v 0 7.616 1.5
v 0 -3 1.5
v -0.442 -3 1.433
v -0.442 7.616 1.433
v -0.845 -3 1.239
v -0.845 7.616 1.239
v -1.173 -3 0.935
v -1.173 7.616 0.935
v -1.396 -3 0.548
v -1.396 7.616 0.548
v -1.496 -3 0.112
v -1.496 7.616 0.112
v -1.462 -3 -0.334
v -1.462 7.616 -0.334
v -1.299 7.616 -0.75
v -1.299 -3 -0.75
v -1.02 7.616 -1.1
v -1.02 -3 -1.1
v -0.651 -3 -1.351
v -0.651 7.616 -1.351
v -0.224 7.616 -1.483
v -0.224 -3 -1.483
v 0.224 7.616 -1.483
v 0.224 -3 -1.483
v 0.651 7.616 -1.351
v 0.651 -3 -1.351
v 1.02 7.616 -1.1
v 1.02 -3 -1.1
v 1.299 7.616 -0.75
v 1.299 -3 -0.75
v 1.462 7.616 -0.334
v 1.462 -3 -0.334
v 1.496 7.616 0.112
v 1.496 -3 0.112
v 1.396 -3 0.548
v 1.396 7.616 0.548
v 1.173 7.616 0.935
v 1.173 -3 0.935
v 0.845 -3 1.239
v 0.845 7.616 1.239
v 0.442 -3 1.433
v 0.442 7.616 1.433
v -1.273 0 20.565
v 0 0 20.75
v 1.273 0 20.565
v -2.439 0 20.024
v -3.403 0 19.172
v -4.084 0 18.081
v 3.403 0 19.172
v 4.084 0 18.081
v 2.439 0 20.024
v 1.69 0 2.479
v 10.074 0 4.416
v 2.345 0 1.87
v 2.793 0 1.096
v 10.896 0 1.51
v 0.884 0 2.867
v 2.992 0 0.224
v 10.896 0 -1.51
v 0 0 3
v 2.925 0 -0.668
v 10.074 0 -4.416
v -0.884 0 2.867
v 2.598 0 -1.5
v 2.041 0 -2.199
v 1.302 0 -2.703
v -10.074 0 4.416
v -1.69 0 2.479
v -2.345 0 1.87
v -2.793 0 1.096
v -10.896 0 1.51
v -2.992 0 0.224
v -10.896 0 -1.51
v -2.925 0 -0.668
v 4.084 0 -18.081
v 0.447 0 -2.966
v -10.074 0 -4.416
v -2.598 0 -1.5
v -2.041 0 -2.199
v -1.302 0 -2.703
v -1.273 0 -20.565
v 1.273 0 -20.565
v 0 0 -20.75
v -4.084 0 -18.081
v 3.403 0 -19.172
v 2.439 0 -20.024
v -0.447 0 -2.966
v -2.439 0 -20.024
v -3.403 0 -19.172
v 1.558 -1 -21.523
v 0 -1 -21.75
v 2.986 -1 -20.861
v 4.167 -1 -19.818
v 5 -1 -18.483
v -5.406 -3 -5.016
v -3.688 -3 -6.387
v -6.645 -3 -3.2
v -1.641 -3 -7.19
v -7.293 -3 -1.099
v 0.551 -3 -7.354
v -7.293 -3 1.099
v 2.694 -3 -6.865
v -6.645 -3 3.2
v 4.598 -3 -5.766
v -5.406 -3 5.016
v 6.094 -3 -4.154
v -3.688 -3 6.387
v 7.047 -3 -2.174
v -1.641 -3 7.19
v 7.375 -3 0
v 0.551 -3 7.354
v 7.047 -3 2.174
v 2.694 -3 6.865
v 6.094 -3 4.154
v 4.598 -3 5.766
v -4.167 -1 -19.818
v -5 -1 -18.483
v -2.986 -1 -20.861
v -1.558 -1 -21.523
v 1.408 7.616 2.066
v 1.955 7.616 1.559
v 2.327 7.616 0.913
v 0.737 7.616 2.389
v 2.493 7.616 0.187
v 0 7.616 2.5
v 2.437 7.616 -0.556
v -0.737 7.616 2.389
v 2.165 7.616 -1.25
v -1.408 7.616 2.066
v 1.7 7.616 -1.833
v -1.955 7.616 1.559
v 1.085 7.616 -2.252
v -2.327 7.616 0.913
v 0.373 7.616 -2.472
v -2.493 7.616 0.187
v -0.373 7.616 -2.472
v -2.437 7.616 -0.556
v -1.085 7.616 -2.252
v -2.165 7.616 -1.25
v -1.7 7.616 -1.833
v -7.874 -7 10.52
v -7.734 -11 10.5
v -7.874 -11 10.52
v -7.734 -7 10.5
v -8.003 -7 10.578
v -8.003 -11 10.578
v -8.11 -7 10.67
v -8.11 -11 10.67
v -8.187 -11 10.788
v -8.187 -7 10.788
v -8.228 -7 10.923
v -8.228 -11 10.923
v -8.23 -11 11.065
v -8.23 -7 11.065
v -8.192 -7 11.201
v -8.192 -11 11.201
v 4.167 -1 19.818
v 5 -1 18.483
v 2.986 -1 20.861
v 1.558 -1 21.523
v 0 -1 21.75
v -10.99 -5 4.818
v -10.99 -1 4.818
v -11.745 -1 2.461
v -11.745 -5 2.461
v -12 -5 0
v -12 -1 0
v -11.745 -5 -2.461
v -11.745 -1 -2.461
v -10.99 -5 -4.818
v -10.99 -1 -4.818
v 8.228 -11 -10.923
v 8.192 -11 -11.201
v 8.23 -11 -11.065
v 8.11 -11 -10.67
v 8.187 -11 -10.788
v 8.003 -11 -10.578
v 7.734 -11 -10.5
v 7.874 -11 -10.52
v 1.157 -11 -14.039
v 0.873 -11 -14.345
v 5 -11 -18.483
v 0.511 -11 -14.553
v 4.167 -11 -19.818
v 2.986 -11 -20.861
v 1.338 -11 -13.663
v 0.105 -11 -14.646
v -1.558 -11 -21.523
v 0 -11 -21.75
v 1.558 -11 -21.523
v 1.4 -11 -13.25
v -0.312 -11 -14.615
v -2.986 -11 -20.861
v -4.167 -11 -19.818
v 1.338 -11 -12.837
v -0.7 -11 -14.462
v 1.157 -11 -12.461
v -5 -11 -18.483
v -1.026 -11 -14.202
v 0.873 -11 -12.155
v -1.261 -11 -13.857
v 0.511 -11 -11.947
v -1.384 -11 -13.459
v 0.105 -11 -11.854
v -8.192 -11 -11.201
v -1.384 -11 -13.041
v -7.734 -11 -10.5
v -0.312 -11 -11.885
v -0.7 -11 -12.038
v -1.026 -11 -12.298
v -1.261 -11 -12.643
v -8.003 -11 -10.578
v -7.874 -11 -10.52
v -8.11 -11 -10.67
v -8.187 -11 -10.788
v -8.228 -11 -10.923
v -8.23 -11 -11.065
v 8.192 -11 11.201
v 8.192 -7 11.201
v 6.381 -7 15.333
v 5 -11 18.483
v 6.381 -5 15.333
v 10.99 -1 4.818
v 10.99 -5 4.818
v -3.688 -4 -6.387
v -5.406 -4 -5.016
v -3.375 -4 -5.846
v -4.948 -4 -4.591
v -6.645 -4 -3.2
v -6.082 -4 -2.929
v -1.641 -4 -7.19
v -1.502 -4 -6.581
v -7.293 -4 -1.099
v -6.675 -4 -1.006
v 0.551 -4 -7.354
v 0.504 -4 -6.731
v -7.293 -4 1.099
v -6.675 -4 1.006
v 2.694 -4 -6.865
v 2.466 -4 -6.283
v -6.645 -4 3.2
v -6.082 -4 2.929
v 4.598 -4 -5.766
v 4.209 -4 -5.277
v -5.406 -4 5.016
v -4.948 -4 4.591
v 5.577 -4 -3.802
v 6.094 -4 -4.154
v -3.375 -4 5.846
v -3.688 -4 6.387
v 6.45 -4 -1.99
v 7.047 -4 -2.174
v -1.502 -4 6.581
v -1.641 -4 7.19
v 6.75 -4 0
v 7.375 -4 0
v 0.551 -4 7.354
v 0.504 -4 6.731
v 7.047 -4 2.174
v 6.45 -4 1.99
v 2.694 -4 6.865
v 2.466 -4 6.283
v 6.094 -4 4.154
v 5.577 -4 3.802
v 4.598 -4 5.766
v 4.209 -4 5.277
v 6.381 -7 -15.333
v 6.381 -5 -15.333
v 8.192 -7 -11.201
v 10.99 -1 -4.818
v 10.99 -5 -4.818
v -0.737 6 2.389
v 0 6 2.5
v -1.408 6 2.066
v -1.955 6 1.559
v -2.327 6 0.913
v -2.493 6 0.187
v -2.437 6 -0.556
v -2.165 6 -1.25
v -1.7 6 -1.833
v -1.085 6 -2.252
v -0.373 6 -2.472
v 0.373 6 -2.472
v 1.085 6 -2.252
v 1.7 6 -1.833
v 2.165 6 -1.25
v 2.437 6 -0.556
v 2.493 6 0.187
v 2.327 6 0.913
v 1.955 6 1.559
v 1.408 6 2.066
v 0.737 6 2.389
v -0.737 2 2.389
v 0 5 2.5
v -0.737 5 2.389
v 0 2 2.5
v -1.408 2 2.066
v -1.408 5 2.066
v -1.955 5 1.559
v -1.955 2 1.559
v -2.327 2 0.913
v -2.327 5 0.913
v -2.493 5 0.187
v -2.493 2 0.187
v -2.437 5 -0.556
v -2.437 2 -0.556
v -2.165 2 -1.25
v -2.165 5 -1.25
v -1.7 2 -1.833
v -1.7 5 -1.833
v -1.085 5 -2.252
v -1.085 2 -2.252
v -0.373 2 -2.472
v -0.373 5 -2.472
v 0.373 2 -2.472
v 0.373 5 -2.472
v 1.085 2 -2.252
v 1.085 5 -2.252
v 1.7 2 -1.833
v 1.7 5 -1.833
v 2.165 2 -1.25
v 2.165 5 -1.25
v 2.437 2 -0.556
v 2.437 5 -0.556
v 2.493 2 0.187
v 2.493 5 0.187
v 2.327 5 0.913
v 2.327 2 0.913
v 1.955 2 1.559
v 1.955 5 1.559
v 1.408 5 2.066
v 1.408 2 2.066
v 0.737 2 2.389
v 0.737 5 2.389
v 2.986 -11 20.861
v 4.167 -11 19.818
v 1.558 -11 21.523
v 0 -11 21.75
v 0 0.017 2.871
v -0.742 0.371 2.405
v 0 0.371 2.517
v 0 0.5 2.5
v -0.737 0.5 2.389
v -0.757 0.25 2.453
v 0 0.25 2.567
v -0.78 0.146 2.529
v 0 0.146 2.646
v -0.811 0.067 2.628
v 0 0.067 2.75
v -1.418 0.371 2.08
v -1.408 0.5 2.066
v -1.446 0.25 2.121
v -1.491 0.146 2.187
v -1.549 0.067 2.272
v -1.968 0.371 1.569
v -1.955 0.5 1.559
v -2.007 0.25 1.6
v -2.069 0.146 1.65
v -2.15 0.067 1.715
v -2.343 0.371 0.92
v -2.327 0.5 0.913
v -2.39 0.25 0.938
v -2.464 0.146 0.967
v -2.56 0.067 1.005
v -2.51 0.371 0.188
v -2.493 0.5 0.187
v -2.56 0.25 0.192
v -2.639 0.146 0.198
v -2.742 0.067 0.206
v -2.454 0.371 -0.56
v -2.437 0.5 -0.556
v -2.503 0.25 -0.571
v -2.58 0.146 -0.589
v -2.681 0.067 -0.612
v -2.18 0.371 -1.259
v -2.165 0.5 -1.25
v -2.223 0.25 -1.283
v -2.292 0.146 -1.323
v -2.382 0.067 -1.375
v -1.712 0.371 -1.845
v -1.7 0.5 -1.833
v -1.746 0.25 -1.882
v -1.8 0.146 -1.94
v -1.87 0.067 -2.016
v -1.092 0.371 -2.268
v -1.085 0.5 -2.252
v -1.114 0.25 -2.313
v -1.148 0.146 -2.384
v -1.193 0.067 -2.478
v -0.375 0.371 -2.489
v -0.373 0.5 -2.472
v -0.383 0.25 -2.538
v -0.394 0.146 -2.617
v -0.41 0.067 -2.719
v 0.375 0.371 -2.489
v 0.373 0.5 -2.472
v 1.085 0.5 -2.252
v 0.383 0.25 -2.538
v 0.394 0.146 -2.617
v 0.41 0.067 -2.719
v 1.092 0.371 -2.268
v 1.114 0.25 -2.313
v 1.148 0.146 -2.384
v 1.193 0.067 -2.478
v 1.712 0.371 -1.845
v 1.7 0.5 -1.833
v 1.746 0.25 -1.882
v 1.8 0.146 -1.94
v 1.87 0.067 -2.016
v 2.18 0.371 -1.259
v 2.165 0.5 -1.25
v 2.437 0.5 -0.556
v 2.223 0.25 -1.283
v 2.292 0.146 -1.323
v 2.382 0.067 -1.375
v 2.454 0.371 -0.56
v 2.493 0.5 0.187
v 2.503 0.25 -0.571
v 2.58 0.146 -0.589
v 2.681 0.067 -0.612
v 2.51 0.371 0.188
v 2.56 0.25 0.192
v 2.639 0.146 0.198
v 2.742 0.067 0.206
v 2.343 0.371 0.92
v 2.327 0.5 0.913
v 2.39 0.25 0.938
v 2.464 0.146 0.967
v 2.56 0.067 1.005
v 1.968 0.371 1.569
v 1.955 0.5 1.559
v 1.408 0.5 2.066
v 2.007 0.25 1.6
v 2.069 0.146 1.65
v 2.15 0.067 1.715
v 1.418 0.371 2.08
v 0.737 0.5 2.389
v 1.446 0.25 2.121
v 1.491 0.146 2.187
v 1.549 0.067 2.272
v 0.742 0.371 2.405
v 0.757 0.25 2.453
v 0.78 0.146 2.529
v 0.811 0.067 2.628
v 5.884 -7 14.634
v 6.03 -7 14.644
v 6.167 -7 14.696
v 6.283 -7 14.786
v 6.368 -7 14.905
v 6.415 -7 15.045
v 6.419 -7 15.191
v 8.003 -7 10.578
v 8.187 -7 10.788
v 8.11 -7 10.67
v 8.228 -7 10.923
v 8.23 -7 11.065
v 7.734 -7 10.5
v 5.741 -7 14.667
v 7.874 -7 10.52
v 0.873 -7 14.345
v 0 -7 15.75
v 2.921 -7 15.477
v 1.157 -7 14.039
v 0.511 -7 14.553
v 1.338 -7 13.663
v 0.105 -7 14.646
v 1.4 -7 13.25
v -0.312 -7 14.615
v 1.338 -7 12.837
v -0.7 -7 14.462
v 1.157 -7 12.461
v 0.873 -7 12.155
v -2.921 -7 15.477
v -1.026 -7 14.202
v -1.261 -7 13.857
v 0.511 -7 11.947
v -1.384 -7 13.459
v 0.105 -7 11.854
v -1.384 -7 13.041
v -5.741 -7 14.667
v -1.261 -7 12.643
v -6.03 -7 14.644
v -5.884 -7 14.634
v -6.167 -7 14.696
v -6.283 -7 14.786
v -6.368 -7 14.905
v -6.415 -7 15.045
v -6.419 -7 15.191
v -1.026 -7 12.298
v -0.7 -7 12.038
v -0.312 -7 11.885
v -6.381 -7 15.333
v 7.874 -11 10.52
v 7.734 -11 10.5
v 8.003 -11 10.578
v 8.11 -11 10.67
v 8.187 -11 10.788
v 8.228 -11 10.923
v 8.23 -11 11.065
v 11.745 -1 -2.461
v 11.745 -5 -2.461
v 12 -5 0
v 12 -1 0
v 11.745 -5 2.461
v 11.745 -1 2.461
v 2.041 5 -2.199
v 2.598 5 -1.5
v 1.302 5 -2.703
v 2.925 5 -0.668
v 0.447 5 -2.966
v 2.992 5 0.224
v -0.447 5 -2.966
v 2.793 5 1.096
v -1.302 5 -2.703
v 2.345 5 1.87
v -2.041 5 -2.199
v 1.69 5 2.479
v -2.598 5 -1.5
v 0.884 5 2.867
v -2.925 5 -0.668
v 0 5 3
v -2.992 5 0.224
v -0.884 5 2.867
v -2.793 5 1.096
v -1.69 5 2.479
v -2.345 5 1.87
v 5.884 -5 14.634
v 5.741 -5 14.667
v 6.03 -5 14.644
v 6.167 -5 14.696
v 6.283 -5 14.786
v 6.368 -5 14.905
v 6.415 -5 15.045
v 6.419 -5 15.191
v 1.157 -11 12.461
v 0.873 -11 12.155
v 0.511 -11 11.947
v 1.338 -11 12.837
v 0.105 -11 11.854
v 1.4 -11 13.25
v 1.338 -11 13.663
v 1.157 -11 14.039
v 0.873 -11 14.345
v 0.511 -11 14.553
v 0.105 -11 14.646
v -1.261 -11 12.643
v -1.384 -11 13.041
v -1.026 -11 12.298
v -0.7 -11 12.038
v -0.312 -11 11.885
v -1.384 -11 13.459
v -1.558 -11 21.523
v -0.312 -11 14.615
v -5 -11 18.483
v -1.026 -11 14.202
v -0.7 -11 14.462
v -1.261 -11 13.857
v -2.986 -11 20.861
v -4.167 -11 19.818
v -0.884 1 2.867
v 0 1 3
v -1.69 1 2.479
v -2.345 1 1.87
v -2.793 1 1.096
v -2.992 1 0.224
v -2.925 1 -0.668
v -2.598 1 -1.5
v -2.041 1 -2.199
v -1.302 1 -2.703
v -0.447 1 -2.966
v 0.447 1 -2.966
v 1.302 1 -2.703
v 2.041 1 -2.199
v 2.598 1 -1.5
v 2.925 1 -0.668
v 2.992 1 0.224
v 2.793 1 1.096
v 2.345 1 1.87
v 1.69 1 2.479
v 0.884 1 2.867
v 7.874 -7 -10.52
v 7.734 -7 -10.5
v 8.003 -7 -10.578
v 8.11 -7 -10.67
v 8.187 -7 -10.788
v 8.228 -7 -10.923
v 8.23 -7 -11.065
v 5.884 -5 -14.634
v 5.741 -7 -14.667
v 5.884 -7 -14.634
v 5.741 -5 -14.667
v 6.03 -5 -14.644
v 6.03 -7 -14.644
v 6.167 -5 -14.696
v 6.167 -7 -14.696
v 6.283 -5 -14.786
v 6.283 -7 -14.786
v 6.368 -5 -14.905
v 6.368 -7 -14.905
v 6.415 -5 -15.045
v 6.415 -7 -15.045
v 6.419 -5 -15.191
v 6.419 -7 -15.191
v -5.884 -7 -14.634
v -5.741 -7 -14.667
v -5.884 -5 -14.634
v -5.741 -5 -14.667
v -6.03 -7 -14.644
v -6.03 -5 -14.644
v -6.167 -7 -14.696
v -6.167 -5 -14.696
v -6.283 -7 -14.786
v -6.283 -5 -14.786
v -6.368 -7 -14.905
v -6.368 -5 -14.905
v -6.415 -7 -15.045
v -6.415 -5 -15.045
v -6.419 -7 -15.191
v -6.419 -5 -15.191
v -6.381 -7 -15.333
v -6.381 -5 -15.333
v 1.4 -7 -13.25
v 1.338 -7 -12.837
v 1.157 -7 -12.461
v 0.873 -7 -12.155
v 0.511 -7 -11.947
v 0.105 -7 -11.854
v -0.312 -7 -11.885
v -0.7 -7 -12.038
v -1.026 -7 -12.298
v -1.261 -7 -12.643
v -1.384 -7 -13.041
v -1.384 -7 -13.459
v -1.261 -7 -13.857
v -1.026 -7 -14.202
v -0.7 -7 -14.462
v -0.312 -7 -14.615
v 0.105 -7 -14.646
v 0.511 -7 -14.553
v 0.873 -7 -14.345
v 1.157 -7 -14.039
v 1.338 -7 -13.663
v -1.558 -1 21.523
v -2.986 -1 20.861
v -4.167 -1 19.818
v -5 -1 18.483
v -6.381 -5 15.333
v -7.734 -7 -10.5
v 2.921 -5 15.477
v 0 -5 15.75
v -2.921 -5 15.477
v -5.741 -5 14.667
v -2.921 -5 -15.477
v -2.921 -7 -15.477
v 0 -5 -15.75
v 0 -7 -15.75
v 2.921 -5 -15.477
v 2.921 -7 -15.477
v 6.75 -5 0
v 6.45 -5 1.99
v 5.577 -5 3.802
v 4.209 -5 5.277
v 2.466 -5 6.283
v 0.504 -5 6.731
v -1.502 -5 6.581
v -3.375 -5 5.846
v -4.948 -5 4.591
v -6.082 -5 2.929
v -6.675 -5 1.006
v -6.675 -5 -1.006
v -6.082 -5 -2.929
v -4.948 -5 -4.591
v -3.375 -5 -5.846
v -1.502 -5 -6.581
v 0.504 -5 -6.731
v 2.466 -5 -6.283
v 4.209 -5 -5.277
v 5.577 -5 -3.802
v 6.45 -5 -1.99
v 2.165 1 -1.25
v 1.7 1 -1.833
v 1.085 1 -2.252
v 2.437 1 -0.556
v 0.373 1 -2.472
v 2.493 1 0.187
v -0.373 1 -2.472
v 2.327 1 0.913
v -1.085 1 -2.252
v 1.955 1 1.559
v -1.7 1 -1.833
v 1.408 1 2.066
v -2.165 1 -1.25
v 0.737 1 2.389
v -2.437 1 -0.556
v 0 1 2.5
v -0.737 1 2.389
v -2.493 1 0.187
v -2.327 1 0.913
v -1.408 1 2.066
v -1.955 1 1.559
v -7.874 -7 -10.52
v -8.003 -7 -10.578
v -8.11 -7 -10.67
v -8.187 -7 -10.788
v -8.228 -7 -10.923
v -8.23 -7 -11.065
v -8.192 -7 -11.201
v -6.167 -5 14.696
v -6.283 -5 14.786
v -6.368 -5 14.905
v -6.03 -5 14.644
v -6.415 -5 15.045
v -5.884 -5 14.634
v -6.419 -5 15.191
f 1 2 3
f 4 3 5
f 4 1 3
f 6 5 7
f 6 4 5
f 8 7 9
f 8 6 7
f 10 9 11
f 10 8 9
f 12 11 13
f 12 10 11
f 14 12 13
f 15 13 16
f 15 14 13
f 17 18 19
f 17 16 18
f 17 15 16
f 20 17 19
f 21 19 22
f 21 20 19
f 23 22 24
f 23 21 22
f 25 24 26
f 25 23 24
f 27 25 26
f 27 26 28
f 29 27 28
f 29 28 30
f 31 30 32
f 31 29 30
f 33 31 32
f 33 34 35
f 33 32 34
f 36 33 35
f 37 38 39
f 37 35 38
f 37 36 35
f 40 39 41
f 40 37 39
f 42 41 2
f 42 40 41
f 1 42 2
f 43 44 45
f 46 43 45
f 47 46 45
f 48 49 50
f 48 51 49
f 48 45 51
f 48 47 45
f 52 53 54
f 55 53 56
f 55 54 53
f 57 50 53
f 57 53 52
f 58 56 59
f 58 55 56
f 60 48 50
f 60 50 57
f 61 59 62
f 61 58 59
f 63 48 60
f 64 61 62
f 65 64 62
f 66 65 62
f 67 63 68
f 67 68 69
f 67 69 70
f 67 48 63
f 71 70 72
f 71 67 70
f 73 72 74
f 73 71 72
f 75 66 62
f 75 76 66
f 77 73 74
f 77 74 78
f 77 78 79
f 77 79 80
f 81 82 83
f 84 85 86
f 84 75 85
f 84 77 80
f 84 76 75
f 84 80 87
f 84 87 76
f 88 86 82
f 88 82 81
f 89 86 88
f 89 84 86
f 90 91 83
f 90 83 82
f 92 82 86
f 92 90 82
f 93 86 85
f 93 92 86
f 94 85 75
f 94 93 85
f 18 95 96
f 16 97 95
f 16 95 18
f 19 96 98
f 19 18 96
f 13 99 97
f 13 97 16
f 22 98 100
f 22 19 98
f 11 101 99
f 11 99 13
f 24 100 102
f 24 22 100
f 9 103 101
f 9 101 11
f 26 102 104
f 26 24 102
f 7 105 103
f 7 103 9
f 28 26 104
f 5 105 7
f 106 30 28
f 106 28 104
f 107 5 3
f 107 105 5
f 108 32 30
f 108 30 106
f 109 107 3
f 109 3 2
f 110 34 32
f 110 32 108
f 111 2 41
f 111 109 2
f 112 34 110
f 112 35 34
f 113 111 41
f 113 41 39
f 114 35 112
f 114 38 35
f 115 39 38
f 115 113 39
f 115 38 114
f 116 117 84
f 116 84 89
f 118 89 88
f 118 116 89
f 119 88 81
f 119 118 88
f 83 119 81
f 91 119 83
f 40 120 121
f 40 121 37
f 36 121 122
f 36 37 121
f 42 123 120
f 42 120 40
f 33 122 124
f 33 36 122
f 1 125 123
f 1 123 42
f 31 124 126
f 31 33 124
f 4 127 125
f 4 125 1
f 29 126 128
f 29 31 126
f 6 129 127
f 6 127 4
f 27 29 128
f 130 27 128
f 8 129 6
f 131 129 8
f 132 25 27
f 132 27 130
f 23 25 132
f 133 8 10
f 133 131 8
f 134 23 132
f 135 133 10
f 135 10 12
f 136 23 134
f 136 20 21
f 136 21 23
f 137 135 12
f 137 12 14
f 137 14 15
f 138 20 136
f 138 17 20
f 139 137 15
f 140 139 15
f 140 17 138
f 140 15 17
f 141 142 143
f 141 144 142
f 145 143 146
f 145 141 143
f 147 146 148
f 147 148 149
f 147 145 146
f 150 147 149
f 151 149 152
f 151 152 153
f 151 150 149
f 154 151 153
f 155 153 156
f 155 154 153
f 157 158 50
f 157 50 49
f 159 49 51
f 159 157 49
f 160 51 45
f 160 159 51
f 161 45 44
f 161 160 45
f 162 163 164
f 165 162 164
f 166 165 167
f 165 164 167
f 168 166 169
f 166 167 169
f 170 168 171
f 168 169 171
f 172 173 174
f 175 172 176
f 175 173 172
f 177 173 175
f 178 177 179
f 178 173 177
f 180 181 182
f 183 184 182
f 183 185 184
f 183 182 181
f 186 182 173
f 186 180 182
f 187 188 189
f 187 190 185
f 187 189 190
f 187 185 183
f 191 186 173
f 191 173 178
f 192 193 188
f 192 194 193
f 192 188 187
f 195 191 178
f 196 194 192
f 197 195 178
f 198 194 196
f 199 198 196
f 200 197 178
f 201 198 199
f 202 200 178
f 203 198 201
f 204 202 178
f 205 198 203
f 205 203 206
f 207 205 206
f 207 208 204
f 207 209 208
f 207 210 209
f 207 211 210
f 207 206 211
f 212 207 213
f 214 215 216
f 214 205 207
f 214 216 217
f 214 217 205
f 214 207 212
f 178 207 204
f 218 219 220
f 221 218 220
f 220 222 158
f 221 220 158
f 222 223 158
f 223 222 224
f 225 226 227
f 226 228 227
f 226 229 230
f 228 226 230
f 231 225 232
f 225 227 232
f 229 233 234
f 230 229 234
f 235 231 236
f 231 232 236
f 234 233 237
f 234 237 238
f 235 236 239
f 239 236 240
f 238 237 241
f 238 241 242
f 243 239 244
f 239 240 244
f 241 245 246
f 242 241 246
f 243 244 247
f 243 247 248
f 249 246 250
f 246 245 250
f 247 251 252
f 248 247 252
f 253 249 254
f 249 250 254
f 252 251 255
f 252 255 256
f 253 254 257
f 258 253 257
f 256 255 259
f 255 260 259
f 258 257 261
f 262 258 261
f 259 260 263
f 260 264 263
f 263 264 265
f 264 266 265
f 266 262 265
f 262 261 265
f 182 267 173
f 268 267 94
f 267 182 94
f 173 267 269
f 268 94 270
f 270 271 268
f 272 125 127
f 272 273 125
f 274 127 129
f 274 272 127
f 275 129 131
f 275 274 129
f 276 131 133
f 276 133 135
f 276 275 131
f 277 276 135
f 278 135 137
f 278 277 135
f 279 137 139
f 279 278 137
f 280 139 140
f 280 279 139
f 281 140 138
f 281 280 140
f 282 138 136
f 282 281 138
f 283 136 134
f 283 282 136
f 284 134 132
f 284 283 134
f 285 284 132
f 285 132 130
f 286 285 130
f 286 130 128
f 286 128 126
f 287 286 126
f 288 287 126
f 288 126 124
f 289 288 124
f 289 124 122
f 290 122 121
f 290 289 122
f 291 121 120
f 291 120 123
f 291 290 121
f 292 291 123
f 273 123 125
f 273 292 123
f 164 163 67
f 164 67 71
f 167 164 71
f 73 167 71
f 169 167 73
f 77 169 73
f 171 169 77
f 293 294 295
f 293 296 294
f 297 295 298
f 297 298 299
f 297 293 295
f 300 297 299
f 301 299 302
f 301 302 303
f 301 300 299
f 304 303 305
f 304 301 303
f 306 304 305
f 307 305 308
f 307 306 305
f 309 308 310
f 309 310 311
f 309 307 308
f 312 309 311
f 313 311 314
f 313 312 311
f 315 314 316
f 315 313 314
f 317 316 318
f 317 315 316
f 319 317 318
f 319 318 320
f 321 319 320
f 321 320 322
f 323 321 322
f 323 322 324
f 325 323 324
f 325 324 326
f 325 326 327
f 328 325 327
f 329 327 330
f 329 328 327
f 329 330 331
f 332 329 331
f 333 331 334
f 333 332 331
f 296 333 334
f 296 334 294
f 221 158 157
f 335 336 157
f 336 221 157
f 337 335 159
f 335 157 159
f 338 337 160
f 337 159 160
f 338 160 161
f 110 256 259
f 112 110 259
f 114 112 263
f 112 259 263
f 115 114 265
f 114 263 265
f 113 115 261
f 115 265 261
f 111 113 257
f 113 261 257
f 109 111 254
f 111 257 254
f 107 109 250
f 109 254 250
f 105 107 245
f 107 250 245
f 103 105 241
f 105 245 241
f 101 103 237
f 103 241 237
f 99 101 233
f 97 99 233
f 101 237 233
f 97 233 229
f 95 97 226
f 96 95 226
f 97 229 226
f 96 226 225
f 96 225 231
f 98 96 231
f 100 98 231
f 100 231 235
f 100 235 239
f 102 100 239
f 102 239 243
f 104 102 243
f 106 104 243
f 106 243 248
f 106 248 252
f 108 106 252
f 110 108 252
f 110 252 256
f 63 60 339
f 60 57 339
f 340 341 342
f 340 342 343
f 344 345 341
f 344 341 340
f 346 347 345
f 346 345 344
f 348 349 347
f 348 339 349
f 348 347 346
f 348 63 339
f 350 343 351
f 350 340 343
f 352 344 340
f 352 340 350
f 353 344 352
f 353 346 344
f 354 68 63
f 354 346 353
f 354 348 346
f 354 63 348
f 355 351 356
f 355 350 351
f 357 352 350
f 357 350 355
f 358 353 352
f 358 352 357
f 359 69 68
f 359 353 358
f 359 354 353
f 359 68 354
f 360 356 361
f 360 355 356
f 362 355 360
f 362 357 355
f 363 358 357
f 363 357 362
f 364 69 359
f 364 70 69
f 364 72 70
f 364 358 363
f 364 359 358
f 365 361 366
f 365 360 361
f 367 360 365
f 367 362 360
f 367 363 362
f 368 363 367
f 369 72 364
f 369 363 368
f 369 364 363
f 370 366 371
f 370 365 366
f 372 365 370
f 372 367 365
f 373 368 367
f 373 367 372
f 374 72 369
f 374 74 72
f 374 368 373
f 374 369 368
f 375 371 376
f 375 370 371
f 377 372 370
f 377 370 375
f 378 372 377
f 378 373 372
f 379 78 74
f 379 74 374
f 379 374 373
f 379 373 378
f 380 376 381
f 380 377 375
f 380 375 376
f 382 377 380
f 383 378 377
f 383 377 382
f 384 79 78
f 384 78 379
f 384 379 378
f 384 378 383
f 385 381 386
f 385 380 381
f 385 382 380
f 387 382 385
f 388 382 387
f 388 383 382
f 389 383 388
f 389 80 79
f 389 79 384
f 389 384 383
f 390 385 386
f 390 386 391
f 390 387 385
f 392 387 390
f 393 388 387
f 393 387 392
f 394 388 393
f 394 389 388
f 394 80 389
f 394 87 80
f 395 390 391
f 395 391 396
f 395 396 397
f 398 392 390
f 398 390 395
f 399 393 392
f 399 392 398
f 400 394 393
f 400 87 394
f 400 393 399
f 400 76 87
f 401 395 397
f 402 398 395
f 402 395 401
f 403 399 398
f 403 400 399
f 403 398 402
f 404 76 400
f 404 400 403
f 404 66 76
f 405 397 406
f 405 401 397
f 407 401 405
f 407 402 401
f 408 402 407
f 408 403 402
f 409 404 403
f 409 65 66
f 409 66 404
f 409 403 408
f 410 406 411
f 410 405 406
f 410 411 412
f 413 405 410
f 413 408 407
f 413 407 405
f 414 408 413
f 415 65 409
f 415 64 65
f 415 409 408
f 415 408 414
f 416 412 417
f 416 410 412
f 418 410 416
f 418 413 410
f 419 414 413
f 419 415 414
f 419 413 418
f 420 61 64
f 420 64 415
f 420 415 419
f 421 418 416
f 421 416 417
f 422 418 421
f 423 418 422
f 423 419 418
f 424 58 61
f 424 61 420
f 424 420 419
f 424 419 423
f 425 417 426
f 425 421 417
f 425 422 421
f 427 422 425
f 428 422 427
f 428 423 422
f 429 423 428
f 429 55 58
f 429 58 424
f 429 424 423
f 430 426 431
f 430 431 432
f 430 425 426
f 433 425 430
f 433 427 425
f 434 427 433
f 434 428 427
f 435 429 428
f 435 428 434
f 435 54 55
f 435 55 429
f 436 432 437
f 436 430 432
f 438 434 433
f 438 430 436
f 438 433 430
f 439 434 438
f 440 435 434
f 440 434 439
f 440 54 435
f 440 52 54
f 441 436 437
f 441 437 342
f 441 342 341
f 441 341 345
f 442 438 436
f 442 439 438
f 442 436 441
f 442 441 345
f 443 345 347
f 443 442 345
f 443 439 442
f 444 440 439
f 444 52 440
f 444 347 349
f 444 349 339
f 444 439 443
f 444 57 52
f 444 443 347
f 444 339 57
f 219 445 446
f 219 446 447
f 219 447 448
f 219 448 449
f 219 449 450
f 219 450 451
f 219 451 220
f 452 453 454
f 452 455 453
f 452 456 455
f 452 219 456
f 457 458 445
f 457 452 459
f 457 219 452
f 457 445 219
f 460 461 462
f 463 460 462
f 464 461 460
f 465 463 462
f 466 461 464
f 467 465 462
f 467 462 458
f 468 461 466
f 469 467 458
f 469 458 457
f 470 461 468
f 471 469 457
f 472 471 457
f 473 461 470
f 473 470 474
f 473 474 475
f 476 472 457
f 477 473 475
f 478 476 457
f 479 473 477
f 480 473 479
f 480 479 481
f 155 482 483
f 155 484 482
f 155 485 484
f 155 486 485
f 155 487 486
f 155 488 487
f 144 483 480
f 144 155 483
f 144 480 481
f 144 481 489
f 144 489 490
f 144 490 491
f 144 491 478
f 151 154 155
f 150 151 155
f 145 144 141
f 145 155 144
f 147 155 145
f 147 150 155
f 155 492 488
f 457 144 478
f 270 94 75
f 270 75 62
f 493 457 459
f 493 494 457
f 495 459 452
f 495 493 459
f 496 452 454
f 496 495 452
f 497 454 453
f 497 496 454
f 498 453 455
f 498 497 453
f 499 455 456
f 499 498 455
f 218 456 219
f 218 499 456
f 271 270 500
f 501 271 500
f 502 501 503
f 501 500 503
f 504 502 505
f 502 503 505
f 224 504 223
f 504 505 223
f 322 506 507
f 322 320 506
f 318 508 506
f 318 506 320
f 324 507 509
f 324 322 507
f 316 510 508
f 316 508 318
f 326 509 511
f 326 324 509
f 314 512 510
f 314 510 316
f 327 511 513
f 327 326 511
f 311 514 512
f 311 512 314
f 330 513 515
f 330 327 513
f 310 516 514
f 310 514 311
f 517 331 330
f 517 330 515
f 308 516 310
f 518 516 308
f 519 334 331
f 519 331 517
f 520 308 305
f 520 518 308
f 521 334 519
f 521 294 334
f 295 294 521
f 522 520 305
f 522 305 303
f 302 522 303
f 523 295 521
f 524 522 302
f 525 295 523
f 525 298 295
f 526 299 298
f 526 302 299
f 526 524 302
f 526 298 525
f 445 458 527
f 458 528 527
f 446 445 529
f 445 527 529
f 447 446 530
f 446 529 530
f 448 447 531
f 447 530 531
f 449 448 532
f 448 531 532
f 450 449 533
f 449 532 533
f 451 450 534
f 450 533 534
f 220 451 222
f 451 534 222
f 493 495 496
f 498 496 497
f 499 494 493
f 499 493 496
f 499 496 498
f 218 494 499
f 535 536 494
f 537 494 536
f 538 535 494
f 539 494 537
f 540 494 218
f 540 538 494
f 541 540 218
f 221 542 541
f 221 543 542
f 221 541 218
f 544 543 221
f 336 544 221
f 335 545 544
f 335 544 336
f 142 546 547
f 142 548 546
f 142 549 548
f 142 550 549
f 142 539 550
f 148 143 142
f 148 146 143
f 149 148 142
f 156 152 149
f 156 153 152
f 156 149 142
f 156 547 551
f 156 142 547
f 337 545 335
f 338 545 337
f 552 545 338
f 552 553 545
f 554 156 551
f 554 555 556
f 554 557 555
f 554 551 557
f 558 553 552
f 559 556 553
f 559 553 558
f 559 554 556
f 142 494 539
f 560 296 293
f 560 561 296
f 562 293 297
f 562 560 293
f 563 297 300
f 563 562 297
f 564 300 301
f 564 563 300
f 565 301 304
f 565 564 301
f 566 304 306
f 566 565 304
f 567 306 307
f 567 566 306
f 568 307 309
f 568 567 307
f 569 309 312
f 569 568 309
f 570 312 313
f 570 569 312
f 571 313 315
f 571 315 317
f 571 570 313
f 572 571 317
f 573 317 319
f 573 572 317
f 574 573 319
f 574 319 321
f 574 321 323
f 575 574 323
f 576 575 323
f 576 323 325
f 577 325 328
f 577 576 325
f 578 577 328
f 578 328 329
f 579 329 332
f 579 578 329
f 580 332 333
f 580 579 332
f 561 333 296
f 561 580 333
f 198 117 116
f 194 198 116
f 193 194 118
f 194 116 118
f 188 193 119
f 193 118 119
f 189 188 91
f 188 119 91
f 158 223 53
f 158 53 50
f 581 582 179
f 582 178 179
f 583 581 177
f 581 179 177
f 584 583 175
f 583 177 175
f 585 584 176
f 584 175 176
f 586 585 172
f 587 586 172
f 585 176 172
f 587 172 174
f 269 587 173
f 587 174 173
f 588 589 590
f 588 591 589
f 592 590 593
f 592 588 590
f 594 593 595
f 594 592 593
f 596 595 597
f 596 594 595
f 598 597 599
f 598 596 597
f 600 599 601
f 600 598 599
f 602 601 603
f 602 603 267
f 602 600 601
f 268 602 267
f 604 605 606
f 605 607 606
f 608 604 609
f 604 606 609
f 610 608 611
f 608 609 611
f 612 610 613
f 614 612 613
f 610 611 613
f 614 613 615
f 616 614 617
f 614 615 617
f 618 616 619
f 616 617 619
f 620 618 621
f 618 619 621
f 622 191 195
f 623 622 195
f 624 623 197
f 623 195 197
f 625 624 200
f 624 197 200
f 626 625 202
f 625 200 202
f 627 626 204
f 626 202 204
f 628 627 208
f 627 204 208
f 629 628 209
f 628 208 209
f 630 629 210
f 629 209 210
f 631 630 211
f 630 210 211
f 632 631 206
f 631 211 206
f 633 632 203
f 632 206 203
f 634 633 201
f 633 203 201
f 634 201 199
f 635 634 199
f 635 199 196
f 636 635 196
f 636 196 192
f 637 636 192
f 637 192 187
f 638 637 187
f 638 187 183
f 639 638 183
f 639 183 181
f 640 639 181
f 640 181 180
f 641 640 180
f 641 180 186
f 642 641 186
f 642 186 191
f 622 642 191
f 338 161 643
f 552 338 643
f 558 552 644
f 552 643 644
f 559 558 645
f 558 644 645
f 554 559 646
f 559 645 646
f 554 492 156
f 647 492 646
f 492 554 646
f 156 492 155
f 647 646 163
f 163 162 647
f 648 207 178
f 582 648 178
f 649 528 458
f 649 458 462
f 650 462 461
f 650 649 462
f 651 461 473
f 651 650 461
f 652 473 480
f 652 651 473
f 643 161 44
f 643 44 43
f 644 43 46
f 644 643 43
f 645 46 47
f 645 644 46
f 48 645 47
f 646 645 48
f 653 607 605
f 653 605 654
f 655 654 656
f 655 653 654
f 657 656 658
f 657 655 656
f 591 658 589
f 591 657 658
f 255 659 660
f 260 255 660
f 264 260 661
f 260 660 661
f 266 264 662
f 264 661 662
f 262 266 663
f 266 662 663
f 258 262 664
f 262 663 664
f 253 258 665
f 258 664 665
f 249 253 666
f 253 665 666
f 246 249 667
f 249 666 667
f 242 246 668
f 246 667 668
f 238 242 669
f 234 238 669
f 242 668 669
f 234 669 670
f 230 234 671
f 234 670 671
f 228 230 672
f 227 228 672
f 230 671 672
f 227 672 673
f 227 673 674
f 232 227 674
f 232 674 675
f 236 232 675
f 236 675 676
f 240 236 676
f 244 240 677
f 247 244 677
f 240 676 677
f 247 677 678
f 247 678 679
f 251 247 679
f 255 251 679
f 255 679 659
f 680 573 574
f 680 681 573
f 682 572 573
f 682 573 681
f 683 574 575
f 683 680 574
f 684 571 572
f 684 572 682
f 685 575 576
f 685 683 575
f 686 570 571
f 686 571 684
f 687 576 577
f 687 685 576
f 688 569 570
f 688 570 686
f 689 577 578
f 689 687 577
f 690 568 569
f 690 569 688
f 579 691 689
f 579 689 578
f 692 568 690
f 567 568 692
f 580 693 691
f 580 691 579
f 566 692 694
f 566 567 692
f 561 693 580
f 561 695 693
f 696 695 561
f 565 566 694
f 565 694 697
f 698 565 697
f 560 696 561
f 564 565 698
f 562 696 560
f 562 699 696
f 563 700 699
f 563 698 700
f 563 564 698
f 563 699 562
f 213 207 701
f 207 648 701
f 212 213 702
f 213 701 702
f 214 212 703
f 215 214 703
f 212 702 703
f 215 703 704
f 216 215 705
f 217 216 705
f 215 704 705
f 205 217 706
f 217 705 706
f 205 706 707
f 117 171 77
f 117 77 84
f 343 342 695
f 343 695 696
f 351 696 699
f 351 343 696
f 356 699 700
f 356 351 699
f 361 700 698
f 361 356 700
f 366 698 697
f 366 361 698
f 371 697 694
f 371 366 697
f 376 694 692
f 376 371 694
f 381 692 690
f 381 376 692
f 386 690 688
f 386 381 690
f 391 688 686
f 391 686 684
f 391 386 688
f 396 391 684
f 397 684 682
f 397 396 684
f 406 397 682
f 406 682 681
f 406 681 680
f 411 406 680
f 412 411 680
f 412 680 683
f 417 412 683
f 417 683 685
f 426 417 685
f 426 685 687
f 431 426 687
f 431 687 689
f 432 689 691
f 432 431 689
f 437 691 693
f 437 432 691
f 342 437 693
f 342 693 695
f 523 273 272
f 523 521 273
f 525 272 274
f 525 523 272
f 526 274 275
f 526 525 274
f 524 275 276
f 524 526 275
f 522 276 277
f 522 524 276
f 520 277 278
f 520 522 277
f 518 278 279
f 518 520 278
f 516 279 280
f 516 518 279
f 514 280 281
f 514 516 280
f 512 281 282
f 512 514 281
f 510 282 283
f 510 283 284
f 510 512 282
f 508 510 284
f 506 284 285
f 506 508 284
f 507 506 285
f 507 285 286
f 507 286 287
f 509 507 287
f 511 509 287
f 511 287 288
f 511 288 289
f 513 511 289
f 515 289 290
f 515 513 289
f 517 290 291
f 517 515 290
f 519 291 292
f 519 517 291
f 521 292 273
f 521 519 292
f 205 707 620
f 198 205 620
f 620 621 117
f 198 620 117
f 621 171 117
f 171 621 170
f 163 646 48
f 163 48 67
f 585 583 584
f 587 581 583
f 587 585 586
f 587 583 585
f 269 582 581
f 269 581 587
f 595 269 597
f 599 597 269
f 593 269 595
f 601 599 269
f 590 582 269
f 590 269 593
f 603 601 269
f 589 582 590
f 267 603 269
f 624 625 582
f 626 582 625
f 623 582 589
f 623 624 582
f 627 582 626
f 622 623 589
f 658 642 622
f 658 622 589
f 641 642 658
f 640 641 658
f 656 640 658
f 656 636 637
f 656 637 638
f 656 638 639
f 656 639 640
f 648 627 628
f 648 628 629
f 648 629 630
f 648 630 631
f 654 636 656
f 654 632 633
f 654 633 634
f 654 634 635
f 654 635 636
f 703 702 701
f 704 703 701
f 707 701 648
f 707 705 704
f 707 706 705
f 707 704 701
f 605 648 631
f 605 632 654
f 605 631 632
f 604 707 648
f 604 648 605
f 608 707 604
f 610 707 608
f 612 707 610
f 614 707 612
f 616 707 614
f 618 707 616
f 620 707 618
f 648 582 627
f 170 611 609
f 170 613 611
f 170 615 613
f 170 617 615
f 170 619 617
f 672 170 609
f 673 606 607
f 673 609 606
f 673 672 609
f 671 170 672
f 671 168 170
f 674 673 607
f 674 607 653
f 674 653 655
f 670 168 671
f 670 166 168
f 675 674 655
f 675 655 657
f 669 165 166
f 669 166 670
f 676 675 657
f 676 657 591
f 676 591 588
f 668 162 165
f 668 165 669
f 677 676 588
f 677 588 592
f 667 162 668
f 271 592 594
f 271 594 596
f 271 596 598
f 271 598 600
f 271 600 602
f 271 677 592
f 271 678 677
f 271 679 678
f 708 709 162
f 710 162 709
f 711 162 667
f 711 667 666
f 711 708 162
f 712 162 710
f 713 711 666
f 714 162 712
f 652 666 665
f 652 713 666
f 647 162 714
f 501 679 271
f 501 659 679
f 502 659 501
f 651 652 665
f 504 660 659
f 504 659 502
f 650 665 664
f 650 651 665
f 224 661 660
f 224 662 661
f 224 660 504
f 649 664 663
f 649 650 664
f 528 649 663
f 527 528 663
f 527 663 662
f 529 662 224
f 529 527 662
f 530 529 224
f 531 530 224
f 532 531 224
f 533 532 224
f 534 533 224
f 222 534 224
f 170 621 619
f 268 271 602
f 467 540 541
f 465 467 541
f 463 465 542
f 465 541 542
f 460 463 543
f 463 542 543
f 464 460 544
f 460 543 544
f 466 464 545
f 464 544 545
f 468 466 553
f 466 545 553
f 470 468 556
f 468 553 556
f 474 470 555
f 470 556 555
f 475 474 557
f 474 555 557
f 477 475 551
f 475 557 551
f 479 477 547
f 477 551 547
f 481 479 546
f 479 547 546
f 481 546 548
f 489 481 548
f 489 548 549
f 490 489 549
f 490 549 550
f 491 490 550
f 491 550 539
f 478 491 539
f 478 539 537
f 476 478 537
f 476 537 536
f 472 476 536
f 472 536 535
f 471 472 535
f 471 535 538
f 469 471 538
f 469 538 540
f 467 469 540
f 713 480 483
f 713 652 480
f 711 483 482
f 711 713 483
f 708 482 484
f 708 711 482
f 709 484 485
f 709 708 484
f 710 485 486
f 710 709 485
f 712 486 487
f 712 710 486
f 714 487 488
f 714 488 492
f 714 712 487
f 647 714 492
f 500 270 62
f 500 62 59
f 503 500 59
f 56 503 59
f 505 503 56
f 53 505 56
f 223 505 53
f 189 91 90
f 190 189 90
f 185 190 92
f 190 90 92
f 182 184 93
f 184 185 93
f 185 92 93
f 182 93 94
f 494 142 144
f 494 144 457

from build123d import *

# Parameters (mm, degrees)
CUT_EXTRUDE1_DEPTH  = 12
SKETCH5_W           = 24
SKETCH5_H           = 21
CUT_EXTRUDE3_DEPTH  = 6
FILLET1_R           = 0.5
FILLET3_R           = 0.5
CHAMFER2_SIZE       = 1
SKETCH12_R          = 1.4
CUT_EXTRUDE7_DEPTH  = 6
SKETCH13_R          = 7.375
CUT_EXTRUDE8_DEPTH  = 2
SKETCH14_R          = 7.375
SKETCH14_R_2        = 6.75
BOSS_EXTRUDE1_DEPTH = 1


with BuildPart() as part:
    # Sketch2 → Revolve1 (revolve)
    with BuildSketch(Plane(origin=(0, 0, 0), x_dir=(0, 0, -1), z_dir=(1, 0, 0))):
        Polygon((-2.5, 0), (-21.75, 0), (-21.75, -11), (-8.75, -11), (-8.75, -7), (-15.75, -7), (-15.75, -5), (-1.5, -5), (-1.5, 6), (-1.5, 7.616444111), (-2.5, 7.616444111), (-2.5, 6), (-3, 5), (-2.5, 5), (-2.5, 2), (-3, 1), (-2.5, 1), align=None)
    revolve(axis=Axis((0, 7.880012575, 0), (0, -1, 0)))

    # Sketch3 → Cut-Extrude1 (cut, through all)
    with BuildSketch(Plane(origin=(0, 0, 0), x_dir=(1, 0, 0), z_dir=(0, 1, 0))):
        with BuildLine():
            ThreePointArc((-10.990322793, -4.817966886), (-12, 0), (-10.990322793, 4.817966886))
            Line((-10.990322793, 4.817966886), (-5, 18.48256498))
            ThreePointArc((-5, 18.48256498), (-2.986475006, 20.860711972), (-2.4e-08, 21.75))
            ThreePointArc((-2.4e-08, 21.75), (-21.75, -1.1e-08), (-2e-09, -21.75))
            ThreePointArc((-2e-09, -21.75), (-2.986474997, -20.860711978), (-5, -18.48256498))
            Line((-5, -18.48256498), (-10.990322793, -4.817966886))
        make_face()
        with BuildLine():
            ThreePointArc((21.75, 0), (15.379572482, 15.379572499), (-2.4e-08, 21.75))
            ThreePointArc((-2.4e-08, 21.75), (2.986474986, 20.860711985), (5, 18.48256498))
            Line((5, 18.48256498), (10.990322793, 4.817966886))
            ThreePointArc((10.990322793, 4.817966886), (12, 0), (10.990322793, -4.817966886))
            Line((10.990322793, -4.817966886), (5, -18.48256498))
            ThreePointArc((5, -18.48256498), (2.986474995, -20.860711979), (-2e-09, -21.75))
            ThreePointArc((-2e-09, -21.75), (15.37957249, -15.379572492), (21.75, 0))
        make_face()
    extrude(amount=-CUT_EXTRUDE1_DEPTH, mode=Mode.SUBTRACT)

    # Sketch5 → Cut-Extrude3 (cut)
    with BuildSketch(Plane.XZ.offset(11)):
        Rectangle(SKETCH5_W, SKETCH5_H)
    extrude(amount=-CUT_EXTRUDE3_DEPTH, mode=Mode.SUBTRACT)

    # Fillet1
    fillet1_edges = [part.edges().sort_by_distance(p)[0] for p in [
        (8.49941803, -9, 10.5),
        (-8.49941803, -9, 10.5),
        (-8.49941803, -9, -10.5),
        (-6.894608136, -6, -14.160751345),
        (-6.894608136, -6, 14.160751345),
        (6.894608136, -6, -14.160751345),
        (6.894608136, -6, 14.160751345),
        (8.49941803, -9, -10.5),
    ]]
    fillet(fillet1_edges, radius=FILLET1_R)

    # Fillet3
    fillet3_edges = [part.edges().sort_by_distance(p)[0] for p in [
        (0, 0, -2.5),
    ]]
    fillet(fillet3_edges, radius=FILLET3_R)

    # Chamfer2
    chamfer2_edges = [part.edges().sort_by_distance(p)[0] for p in [
        (0, 0, 21.75),
        (-7.995161396, 0, 11.650265933),
        (-12, 0, 0),
        (-7.995161396, 0, -11.650265933),
        (0, 0, -21.75),
        (7.995161396, 0, 11.650265933),
        (7.995161396, 0, -11.650265933),
        (12, 0, 0),
    ]]
    chamfer(chamfer2_edges, length=CHAMFER2_SIZE)

    # Sketch12 → Cut-Extrude7 (cut)
    with BuildSketch(Plane.XZ.offset(11)):
        with Locations((0, -13.25)):
            Circle(SKETCH12_R)
        with Locations((0, 13.25)):
            Circle(SKETCH12_R)
    extrude(amount=-CUT_EXTRUDE7_DEPTH, mode=Mode.SUBTRACT)

    # Sketch13 → Cut-Extrude8 (cut)
    with BuildSketch(Plane.XZ.offset(5)):
        Circle(SKETCH13_R)
    extrude(amount=-CUT_EXTRUDE8_DEPTH, mode=Mode.SUBTRACT)


with BuildPart() as body_2:
    # Sketch14 → Boss-Extrude1 (new body)
    with BuildSketch(Plane.XZ.offset(5)):
        Circle(SKETCH14_R)
        Circle(SKETCH14_R_2, mode=Mode.SUBTRACT)
    extrude(amount=-BOSS_EXTRUDE1_DEPTH)


with BuildPart() as part_1:
    add(part.part)

    # Combine1: union body 2
    add(body_2.part)


solid = part_1.part
